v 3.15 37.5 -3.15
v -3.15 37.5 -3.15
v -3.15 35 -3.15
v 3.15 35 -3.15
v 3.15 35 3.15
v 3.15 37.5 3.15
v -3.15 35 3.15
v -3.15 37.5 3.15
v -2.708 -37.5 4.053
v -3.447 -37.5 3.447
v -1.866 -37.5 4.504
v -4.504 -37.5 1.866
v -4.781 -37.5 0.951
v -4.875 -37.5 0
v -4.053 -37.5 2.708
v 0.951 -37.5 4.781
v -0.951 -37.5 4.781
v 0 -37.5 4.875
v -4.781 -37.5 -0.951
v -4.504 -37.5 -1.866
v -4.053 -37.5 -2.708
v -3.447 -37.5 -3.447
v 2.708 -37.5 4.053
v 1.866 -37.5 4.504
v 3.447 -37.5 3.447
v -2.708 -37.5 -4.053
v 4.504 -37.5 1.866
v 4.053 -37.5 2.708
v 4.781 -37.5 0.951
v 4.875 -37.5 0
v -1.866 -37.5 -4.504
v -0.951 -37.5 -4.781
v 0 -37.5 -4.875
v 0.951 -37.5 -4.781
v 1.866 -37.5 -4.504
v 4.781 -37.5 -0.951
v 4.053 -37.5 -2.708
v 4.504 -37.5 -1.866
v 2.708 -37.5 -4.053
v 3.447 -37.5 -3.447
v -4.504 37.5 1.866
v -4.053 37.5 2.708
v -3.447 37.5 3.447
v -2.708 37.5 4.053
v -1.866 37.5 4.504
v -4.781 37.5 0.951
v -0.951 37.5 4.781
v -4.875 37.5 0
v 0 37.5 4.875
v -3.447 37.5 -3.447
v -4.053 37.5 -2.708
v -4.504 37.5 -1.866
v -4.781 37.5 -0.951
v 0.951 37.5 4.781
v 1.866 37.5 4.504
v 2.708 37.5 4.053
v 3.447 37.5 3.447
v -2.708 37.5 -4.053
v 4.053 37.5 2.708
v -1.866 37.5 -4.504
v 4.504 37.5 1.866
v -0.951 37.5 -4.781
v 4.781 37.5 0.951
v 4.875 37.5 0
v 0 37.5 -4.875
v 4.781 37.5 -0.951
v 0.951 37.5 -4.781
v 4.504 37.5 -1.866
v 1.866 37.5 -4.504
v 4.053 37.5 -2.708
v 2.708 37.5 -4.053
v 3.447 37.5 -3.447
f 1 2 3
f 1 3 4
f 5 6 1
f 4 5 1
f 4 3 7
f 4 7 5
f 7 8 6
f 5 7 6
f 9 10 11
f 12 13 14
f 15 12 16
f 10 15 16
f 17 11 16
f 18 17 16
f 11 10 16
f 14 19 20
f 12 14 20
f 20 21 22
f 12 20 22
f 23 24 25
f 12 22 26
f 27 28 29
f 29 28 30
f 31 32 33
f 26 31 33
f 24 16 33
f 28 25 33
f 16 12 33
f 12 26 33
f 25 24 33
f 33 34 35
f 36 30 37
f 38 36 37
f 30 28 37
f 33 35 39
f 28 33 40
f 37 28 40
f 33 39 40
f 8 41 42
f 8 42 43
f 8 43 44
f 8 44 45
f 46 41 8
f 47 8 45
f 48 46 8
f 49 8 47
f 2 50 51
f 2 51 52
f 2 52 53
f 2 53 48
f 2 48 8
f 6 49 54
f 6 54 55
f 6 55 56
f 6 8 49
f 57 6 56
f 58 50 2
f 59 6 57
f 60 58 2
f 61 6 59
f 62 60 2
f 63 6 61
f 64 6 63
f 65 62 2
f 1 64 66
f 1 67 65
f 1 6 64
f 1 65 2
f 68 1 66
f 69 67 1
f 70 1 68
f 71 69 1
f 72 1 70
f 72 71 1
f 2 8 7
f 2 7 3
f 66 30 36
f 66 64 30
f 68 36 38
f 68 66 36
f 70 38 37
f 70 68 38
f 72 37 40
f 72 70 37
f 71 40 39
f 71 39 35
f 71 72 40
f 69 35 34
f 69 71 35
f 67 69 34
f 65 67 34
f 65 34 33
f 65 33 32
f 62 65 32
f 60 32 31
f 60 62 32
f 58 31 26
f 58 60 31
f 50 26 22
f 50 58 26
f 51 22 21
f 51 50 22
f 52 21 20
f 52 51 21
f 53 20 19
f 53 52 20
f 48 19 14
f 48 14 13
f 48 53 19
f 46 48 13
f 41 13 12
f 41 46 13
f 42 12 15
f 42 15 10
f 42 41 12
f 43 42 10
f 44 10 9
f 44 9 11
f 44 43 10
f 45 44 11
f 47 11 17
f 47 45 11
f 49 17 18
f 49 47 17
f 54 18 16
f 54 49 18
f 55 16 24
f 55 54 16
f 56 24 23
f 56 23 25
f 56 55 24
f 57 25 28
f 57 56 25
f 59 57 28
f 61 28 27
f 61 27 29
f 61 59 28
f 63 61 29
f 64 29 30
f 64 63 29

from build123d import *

# Parameters (mm, degrees)
SKETCH1_R           = 4.875
BOSS_EXTRUDE1_DEPTH = 37.5
SKETCH2_W           = 6.3
SKETCH2_H           = 6.3
BOSS_EXTRUDE2_DEPTH = 2.5
SKETCH3_W           = 6.3
SKETCH3_H           = 6.3
CUT_EXTRUDE1_DEPTH  = 5


with BuildPart() as part:
    # Sketch1 → Boss-Extrude1 (new body, symmetric)
    with BuildSketch(Plane(origin=(0, 0, 0), x_dir=(1, 0, 0), z_dir=(0, 1, 0))):
        Circle(SKETCH1_R)
    extrude(amount=BOSS_EXTRUDE1_DEPTH, both=True)

    # Sketch2 → Boss-Extrude2 (add)
    with BuildSketch(Plane(origin=(0, 37.5, 0), x_dir=(1, 0, 0), z_dir=(0, 1, 0))):
        Rectangle(SKETCH2_W, SKETCH2_H)
    extrude(amount=BOSS_EXTRUDE2_DEPTH)

    # Sketch3 → Cut-Extrude1 (cut)
    with BuildSketch(Plane(origin=(0, 40, 0), x_dir=(1, 0, 0), z_dir=(0, 1, 0))):
        Rectangle(SKETCH3_W, SKETCH3_H)
    extrude(amount=-CUT_EXTRUDE1_DEPTH, mode=Mode.SUBTRACT)


solid = part.part
